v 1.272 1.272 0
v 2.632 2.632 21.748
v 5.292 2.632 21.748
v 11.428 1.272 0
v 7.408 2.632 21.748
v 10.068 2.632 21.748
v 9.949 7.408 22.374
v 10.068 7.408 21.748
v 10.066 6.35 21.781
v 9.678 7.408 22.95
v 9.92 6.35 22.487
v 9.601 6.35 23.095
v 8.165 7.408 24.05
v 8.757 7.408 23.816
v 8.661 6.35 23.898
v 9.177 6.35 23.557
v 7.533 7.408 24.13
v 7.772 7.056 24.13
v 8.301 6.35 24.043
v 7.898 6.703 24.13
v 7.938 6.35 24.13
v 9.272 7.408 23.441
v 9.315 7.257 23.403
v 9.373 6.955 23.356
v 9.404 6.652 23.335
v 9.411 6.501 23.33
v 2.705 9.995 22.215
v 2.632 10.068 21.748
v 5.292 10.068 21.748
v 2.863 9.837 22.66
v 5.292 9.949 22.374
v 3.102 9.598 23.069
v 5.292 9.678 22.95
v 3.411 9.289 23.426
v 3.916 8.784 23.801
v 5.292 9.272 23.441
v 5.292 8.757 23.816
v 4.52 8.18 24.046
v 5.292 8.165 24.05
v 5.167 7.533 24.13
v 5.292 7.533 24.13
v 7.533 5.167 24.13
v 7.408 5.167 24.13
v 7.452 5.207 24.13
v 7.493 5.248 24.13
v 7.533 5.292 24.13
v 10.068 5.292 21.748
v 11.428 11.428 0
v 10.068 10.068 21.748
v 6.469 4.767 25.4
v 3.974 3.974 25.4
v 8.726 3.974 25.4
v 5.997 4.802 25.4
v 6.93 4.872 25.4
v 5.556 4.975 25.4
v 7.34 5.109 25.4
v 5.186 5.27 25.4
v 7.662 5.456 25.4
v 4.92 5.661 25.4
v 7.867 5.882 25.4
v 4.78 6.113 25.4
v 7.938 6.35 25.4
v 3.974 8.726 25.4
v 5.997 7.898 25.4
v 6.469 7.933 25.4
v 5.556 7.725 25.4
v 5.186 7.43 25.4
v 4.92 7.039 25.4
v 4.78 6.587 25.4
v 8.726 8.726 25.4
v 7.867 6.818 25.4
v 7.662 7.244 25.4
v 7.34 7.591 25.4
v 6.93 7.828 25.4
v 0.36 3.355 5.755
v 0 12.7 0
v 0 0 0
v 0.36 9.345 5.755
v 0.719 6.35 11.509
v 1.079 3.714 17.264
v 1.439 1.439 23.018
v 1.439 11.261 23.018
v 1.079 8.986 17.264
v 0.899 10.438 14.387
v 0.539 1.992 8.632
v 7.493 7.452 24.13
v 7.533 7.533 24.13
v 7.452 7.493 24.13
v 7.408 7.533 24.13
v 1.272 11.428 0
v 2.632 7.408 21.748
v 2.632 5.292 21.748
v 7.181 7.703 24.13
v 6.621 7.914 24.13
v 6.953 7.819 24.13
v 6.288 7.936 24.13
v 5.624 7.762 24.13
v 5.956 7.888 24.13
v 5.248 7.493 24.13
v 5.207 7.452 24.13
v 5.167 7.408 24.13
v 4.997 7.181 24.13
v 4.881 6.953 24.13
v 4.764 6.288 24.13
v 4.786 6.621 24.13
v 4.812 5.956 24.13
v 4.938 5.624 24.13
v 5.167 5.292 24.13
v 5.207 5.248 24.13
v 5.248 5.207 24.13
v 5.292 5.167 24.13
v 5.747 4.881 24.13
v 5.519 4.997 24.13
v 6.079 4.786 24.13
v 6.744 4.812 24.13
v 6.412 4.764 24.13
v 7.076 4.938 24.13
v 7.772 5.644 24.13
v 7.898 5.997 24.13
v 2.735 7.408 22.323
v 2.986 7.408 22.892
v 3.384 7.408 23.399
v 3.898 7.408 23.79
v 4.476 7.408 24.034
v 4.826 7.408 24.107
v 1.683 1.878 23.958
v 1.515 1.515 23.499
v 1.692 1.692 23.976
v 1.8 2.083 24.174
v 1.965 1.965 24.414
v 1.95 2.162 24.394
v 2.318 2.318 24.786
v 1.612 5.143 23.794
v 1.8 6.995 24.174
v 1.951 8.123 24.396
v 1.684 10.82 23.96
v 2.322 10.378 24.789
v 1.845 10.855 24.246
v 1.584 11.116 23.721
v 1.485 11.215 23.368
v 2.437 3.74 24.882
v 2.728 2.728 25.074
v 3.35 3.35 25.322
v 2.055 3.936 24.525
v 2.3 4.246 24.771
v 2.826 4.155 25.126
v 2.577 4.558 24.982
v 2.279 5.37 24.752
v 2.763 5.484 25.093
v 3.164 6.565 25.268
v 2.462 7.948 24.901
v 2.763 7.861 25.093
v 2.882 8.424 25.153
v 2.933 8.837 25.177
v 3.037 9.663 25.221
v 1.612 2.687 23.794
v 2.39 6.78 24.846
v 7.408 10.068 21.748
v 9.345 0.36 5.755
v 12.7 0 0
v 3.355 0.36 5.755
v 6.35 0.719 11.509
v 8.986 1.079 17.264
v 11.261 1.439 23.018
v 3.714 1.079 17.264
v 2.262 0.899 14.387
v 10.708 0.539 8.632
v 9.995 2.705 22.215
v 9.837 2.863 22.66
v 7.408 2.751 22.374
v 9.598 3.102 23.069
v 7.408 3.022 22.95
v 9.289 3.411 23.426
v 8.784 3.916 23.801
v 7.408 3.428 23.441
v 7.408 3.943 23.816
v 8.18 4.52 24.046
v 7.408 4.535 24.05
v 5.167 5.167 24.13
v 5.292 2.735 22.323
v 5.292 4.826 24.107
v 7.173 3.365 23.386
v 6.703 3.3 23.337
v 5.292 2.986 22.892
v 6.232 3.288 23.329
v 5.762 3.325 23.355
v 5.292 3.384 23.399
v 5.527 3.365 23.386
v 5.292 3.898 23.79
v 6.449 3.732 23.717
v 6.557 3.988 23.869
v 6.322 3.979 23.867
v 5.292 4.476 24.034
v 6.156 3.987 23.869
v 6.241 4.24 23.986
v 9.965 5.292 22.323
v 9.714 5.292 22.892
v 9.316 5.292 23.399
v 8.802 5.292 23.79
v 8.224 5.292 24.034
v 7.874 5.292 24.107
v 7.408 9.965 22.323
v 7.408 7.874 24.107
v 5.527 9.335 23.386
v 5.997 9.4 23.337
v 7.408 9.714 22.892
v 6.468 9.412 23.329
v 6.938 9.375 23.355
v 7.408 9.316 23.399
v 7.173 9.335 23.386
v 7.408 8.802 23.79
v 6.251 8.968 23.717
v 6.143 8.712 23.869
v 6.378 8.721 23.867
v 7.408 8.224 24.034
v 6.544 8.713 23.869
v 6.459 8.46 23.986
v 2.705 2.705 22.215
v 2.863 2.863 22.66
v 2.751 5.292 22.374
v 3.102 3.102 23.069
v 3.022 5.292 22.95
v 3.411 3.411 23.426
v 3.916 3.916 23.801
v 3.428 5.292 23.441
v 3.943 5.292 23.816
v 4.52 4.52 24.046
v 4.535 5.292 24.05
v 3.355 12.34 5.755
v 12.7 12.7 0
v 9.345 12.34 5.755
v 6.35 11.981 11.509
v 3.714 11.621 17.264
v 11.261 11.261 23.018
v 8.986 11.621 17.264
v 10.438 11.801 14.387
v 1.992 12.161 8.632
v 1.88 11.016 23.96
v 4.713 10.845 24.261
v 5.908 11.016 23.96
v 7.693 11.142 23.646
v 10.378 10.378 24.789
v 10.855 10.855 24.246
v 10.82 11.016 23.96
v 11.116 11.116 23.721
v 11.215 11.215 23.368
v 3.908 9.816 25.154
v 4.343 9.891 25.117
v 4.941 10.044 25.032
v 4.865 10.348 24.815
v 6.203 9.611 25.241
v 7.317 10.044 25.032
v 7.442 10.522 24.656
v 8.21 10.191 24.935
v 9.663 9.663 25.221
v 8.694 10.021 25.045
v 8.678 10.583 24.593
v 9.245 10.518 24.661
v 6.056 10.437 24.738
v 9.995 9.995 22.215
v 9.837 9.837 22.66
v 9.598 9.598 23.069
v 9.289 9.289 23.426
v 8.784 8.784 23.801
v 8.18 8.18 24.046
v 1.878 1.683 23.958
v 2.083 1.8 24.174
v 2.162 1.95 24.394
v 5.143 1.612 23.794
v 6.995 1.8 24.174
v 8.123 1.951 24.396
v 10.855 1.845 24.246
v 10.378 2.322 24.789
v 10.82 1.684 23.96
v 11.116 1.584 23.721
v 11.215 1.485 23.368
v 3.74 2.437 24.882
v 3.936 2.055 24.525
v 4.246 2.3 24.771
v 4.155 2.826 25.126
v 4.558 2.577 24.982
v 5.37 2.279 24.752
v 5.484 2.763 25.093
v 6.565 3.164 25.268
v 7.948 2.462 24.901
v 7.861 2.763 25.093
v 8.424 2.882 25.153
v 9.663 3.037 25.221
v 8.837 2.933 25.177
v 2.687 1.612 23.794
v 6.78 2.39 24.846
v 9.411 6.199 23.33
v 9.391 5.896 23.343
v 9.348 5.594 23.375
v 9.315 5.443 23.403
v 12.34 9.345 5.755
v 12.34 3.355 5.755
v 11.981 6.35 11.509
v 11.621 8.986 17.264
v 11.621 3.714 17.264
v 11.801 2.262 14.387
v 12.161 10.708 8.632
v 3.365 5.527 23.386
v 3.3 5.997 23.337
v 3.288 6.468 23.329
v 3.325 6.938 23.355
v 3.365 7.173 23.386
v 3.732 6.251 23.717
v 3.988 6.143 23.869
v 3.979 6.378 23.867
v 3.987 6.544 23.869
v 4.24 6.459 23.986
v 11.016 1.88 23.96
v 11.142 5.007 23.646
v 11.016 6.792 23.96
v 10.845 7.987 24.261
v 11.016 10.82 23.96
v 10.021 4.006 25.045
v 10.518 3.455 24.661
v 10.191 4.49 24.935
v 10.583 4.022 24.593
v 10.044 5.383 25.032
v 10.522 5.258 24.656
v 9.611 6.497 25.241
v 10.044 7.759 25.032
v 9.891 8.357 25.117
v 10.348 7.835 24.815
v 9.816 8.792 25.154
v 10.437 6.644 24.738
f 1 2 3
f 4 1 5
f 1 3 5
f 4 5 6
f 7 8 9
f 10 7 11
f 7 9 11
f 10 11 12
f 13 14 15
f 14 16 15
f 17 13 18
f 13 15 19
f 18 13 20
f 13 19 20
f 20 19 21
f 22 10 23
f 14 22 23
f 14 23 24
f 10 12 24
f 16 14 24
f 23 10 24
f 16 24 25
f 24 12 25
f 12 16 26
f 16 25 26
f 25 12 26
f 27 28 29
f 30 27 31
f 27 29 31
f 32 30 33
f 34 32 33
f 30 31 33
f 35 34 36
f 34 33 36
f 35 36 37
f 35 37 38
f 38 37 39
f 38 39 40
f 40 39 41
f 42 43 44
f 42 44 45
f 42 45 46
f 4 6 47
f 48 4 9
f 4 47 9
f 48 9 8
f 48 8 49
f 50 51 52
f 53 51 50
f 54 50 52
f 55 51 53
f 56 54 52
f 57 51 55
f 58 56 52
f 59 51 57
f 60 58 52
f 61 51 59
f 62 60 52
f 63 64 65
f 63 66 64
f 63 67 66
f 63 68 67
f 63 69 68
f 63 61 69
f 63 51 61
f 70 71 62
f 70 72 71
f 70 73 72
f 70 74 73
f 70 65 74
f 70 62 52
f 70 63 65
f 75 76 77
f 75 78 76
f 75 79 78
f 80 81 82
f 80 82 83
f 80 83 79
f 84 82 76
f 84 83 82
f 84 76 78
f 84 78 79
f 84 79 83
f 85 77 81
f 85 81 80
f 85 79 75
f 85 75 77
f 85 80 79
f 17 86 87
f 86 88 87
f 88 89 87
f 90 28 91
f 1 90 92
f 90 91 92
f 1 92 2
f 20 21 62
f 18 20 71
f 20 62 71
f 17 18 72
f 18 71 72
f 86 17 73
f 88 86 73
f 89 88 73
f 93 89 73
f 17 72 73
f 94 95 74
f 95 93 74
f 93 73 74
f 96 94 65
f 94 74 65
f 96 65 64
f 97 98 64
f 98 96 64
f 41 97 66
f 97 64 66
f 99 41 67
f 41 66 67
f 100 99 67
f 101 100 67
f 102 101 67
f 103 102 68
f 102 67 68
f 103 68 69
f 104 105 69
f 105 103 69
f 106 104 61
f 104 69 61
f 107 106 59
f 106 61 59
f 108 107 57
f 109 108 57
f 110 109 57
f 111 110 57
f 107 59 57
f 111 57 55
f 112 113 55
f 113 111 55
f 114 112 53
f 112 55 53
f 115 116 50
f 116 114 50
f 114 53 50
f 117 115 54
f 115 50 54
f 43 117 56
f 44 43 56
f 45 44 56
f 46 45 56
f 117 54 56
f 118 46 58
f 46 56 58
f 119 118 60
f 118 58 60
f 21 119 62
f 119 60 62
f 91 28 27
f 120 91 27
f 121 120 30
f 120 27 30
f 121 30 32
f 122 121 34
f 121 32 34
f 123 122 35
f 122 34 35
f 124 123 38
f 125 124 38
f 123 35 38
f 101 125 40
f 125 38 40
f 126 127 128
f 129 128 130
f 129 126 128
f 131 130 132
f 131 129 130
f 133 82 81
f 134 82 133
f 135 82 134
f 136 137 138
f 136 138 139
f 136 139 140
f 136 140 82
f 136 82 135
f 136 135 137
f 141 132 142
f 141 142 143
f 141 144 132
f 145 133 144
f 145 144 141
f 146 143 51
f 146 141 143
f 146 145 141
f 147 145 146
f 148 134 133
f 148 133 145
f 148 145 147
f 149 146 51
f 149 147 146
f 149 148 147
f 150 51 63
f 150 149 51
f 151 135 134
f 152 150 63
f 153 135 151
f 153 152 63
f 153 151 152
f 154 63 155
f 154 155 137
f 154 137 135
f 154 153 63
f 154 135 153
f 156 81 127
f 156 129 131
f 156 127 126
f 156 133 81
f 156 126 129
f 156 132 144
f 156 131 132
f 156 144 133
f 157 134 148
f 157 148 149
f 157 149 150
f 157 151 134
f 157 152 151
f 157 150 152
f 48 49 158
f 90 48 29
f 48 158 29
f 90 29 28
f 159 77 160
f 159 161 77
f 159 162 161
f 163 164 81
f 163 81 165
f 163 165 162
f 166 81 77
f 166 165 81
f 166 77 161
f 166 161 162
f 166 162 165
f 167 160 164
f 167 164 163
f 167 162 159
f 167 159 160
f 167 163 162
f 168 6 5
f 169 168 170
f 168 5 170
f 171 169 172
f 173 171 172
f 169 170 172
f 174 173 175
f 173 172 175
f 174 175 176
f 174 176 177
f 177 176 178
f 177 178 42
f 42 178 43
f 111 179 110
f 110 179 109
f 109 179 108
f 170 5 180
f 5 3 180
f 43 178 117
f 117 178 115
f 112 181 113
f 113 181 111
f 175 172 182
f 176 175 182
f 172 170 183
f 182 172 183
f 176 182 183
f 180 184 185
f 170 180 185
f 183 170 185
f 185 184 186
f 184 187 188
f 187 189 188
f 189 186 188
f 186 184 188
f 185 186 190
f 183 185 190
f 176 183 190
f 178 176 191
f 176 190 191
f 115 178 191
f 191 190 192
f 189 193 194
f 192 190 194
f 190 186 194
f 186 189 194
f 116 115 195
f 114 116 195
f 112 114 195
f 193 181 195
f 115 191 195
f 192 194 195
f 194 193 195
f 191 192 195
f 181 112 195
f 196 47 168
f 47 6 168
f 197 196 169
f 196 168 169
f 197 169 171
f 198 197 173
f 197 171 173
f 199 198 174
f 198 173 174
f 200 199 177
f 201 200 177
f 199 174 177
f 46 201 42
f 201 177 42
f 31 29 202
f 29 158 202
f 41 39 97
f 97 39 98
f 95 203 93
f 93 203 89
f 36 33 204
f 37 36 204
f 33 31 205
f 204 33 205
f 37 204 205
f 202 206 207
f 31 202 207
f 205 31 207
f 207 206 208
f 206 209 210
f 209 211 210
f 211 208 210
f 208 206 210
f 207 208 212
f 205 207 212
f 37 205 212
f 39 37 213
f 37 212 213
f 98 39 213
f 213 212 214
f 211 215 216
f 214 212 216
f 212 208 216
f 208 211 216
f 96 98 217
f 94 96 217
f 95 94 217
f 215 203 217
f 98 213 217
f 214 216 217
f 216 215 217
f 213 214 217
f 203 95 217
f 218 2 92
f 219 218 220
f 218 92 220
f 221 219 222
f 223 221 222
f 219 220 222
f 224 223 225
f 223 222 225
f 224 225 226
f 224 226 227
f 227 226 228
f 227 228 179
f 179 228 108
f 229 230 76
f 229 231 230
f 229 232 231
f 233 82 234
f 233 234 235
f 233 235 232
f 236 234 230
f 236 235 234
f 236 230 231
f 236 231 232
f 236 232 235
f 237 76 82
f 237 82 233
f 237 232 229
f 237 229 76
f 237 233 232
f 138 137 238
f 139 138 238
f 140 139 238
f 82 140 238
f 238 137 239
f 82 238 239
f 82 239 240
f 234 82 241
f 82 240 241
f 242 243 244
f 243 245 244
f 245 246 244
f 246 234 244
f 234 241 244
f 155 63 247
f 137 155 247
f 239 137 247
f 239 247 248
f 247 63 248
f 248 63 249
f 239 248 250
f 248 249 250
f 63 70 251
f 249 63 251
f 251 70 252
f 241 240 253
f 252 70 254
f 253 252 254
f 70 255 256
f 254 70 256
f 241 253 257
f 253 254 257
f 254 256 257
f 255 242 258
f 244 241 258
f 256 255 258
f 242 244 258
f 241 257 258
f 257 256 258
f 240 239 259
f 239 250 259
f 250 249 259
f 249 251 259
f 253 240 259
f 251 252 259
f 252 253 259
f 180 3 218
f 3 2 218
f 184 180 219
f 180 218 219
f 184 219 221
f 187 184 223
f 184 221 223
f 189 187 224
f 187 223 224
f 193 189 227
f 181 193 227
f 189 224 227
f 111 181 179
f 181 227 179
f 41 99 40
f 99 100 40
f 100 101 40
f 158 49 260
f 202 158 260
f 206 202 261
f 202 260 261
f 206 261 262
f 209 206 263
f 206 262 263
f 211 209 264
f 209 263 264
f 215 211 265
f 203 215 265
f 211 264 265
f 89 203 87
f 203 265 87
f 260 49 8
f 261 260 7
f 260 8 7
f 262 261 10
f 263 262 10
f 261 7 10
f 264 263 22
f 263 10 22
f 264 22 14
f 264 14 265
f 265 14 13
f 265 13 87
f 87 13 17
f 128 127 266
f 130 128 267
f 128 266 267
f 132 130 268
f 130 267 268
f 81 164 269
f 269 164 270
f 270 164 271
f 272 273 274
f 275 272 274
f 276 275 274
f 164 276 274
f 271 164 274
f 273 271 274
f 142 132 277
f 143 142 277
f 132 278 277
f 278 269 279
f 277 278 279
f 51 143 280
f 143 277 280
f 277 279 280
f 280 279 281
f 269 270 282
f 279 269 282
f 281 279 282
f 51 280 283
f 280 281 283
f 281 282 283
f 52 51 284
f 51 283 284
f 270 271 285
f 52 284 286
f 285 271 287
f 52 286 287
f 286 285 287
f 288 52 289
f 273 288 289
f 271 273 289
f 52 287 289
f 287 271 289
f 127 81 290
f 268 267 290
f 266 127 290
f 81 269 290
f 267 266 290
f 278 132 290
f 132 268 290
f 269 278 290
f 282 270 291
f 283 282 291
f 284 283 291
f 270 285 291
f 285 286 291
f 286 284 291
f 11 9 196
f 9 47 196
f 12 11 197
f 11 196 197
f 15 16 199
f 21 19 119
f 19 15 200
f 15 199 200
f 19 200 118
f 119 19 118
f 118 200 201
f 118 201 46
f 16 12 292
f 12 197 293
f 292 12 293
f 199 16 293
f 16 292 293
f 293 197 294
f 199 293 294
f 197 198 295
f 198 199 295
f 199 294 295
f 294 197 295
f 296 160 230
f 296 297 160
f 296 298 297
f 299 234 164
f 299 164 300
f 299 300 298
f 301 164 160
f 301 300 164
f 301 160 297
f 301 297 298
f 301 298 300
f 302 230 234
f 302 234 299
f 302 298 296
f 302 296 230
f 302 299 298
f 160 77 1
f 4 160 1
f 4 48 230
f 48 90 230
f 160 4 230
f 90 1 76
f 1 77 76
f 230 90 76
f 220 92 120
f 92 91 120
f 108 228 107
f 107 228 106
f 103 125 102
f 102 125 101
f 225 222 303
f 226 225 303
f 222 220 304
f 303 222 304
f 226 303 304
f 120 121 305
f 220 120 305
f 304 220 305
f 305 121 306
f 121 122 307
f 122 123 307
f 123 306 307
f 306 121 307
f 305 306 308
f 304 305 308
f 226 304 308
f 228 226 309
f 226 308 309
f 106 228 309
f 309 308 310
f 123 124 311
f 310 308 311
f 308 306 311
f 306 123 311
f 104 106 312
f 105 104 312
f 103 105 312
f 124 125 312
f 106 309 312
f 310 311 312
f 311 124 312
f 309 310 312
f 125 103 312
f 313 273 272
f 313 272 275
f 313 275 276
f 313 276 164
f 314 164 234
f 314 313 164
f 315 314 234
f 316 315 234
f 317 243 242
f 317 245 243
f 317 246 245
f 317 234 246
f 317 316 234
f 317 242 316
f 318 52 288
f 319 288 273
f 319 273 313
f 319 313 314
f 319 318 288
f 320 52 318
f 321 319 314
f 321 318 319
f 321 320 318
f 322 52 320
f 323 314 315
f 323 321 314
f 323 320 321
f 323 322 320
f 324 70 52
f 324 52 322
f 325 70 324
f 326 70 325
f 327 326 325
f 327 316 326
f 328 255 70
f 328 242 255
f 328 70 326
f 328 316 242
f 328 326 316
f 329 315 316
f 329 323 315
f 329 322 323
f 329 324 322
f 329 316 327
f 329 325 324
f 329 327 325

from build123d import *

# Parameters (mm, degrees)
F0_W     = 12.7
F0_H     = 12.7
F2_W     = 9.525
F2_H     = 9.525
F4_T     = -1.27
F5_R     = 1.5875
F6_DEPTH = 25.4
F7_R     = 2.54


with BuildPart() as f3:
    # F0 (on Top) → F3 section 0
    with BuildSketch(Plane.XY):
        with Locations((6.35, 6.35)):
            Rectangle(F0_W, F0_H)
    # F2 (on offset) → F3 section 1
    with BuildSketch(Plane.XY.offset(25.4)):
        with Locations((6.35, 6.35)):
            Rectangle(F2_W, F2_H)
    loft()

    # F4
    f4_openings = [f3.faces().sort_by_distance(p)[0] for p in [
        (6.35, 6.35, 0),
    ]]
    offset(amount=F4_T, openings=f4_openings)

    # F5 (on face) → F6 (cut)
    with BuildSketch(Plane.XY.offset(25.4)):
        with Locations((6.35, 6.35)):
            Circle(F5_R)
    extrude(amount=-F6_DEPTH, mode=Mode.SUBTRACT)

    # F7
    f7_edges = [f3.edges().sort_by_distance(p)[0] for p in [
        (6.35, 11.1125, 25.4),
        (11.1125, 6.35, 25.4),
        (6.35, 1.5875, 25.4),
        (1.5875, 6.35, 25.4),
        (9.919397, 6.35, 24.13),
        (6.35, 9.919397, 24.13),
        (2.780603, 6.35, 24.13),
        (6.35, 2.780603, 24.13),
    ]]
    fillet(f7_edges, radius=F7_R)


solid = f3.part
